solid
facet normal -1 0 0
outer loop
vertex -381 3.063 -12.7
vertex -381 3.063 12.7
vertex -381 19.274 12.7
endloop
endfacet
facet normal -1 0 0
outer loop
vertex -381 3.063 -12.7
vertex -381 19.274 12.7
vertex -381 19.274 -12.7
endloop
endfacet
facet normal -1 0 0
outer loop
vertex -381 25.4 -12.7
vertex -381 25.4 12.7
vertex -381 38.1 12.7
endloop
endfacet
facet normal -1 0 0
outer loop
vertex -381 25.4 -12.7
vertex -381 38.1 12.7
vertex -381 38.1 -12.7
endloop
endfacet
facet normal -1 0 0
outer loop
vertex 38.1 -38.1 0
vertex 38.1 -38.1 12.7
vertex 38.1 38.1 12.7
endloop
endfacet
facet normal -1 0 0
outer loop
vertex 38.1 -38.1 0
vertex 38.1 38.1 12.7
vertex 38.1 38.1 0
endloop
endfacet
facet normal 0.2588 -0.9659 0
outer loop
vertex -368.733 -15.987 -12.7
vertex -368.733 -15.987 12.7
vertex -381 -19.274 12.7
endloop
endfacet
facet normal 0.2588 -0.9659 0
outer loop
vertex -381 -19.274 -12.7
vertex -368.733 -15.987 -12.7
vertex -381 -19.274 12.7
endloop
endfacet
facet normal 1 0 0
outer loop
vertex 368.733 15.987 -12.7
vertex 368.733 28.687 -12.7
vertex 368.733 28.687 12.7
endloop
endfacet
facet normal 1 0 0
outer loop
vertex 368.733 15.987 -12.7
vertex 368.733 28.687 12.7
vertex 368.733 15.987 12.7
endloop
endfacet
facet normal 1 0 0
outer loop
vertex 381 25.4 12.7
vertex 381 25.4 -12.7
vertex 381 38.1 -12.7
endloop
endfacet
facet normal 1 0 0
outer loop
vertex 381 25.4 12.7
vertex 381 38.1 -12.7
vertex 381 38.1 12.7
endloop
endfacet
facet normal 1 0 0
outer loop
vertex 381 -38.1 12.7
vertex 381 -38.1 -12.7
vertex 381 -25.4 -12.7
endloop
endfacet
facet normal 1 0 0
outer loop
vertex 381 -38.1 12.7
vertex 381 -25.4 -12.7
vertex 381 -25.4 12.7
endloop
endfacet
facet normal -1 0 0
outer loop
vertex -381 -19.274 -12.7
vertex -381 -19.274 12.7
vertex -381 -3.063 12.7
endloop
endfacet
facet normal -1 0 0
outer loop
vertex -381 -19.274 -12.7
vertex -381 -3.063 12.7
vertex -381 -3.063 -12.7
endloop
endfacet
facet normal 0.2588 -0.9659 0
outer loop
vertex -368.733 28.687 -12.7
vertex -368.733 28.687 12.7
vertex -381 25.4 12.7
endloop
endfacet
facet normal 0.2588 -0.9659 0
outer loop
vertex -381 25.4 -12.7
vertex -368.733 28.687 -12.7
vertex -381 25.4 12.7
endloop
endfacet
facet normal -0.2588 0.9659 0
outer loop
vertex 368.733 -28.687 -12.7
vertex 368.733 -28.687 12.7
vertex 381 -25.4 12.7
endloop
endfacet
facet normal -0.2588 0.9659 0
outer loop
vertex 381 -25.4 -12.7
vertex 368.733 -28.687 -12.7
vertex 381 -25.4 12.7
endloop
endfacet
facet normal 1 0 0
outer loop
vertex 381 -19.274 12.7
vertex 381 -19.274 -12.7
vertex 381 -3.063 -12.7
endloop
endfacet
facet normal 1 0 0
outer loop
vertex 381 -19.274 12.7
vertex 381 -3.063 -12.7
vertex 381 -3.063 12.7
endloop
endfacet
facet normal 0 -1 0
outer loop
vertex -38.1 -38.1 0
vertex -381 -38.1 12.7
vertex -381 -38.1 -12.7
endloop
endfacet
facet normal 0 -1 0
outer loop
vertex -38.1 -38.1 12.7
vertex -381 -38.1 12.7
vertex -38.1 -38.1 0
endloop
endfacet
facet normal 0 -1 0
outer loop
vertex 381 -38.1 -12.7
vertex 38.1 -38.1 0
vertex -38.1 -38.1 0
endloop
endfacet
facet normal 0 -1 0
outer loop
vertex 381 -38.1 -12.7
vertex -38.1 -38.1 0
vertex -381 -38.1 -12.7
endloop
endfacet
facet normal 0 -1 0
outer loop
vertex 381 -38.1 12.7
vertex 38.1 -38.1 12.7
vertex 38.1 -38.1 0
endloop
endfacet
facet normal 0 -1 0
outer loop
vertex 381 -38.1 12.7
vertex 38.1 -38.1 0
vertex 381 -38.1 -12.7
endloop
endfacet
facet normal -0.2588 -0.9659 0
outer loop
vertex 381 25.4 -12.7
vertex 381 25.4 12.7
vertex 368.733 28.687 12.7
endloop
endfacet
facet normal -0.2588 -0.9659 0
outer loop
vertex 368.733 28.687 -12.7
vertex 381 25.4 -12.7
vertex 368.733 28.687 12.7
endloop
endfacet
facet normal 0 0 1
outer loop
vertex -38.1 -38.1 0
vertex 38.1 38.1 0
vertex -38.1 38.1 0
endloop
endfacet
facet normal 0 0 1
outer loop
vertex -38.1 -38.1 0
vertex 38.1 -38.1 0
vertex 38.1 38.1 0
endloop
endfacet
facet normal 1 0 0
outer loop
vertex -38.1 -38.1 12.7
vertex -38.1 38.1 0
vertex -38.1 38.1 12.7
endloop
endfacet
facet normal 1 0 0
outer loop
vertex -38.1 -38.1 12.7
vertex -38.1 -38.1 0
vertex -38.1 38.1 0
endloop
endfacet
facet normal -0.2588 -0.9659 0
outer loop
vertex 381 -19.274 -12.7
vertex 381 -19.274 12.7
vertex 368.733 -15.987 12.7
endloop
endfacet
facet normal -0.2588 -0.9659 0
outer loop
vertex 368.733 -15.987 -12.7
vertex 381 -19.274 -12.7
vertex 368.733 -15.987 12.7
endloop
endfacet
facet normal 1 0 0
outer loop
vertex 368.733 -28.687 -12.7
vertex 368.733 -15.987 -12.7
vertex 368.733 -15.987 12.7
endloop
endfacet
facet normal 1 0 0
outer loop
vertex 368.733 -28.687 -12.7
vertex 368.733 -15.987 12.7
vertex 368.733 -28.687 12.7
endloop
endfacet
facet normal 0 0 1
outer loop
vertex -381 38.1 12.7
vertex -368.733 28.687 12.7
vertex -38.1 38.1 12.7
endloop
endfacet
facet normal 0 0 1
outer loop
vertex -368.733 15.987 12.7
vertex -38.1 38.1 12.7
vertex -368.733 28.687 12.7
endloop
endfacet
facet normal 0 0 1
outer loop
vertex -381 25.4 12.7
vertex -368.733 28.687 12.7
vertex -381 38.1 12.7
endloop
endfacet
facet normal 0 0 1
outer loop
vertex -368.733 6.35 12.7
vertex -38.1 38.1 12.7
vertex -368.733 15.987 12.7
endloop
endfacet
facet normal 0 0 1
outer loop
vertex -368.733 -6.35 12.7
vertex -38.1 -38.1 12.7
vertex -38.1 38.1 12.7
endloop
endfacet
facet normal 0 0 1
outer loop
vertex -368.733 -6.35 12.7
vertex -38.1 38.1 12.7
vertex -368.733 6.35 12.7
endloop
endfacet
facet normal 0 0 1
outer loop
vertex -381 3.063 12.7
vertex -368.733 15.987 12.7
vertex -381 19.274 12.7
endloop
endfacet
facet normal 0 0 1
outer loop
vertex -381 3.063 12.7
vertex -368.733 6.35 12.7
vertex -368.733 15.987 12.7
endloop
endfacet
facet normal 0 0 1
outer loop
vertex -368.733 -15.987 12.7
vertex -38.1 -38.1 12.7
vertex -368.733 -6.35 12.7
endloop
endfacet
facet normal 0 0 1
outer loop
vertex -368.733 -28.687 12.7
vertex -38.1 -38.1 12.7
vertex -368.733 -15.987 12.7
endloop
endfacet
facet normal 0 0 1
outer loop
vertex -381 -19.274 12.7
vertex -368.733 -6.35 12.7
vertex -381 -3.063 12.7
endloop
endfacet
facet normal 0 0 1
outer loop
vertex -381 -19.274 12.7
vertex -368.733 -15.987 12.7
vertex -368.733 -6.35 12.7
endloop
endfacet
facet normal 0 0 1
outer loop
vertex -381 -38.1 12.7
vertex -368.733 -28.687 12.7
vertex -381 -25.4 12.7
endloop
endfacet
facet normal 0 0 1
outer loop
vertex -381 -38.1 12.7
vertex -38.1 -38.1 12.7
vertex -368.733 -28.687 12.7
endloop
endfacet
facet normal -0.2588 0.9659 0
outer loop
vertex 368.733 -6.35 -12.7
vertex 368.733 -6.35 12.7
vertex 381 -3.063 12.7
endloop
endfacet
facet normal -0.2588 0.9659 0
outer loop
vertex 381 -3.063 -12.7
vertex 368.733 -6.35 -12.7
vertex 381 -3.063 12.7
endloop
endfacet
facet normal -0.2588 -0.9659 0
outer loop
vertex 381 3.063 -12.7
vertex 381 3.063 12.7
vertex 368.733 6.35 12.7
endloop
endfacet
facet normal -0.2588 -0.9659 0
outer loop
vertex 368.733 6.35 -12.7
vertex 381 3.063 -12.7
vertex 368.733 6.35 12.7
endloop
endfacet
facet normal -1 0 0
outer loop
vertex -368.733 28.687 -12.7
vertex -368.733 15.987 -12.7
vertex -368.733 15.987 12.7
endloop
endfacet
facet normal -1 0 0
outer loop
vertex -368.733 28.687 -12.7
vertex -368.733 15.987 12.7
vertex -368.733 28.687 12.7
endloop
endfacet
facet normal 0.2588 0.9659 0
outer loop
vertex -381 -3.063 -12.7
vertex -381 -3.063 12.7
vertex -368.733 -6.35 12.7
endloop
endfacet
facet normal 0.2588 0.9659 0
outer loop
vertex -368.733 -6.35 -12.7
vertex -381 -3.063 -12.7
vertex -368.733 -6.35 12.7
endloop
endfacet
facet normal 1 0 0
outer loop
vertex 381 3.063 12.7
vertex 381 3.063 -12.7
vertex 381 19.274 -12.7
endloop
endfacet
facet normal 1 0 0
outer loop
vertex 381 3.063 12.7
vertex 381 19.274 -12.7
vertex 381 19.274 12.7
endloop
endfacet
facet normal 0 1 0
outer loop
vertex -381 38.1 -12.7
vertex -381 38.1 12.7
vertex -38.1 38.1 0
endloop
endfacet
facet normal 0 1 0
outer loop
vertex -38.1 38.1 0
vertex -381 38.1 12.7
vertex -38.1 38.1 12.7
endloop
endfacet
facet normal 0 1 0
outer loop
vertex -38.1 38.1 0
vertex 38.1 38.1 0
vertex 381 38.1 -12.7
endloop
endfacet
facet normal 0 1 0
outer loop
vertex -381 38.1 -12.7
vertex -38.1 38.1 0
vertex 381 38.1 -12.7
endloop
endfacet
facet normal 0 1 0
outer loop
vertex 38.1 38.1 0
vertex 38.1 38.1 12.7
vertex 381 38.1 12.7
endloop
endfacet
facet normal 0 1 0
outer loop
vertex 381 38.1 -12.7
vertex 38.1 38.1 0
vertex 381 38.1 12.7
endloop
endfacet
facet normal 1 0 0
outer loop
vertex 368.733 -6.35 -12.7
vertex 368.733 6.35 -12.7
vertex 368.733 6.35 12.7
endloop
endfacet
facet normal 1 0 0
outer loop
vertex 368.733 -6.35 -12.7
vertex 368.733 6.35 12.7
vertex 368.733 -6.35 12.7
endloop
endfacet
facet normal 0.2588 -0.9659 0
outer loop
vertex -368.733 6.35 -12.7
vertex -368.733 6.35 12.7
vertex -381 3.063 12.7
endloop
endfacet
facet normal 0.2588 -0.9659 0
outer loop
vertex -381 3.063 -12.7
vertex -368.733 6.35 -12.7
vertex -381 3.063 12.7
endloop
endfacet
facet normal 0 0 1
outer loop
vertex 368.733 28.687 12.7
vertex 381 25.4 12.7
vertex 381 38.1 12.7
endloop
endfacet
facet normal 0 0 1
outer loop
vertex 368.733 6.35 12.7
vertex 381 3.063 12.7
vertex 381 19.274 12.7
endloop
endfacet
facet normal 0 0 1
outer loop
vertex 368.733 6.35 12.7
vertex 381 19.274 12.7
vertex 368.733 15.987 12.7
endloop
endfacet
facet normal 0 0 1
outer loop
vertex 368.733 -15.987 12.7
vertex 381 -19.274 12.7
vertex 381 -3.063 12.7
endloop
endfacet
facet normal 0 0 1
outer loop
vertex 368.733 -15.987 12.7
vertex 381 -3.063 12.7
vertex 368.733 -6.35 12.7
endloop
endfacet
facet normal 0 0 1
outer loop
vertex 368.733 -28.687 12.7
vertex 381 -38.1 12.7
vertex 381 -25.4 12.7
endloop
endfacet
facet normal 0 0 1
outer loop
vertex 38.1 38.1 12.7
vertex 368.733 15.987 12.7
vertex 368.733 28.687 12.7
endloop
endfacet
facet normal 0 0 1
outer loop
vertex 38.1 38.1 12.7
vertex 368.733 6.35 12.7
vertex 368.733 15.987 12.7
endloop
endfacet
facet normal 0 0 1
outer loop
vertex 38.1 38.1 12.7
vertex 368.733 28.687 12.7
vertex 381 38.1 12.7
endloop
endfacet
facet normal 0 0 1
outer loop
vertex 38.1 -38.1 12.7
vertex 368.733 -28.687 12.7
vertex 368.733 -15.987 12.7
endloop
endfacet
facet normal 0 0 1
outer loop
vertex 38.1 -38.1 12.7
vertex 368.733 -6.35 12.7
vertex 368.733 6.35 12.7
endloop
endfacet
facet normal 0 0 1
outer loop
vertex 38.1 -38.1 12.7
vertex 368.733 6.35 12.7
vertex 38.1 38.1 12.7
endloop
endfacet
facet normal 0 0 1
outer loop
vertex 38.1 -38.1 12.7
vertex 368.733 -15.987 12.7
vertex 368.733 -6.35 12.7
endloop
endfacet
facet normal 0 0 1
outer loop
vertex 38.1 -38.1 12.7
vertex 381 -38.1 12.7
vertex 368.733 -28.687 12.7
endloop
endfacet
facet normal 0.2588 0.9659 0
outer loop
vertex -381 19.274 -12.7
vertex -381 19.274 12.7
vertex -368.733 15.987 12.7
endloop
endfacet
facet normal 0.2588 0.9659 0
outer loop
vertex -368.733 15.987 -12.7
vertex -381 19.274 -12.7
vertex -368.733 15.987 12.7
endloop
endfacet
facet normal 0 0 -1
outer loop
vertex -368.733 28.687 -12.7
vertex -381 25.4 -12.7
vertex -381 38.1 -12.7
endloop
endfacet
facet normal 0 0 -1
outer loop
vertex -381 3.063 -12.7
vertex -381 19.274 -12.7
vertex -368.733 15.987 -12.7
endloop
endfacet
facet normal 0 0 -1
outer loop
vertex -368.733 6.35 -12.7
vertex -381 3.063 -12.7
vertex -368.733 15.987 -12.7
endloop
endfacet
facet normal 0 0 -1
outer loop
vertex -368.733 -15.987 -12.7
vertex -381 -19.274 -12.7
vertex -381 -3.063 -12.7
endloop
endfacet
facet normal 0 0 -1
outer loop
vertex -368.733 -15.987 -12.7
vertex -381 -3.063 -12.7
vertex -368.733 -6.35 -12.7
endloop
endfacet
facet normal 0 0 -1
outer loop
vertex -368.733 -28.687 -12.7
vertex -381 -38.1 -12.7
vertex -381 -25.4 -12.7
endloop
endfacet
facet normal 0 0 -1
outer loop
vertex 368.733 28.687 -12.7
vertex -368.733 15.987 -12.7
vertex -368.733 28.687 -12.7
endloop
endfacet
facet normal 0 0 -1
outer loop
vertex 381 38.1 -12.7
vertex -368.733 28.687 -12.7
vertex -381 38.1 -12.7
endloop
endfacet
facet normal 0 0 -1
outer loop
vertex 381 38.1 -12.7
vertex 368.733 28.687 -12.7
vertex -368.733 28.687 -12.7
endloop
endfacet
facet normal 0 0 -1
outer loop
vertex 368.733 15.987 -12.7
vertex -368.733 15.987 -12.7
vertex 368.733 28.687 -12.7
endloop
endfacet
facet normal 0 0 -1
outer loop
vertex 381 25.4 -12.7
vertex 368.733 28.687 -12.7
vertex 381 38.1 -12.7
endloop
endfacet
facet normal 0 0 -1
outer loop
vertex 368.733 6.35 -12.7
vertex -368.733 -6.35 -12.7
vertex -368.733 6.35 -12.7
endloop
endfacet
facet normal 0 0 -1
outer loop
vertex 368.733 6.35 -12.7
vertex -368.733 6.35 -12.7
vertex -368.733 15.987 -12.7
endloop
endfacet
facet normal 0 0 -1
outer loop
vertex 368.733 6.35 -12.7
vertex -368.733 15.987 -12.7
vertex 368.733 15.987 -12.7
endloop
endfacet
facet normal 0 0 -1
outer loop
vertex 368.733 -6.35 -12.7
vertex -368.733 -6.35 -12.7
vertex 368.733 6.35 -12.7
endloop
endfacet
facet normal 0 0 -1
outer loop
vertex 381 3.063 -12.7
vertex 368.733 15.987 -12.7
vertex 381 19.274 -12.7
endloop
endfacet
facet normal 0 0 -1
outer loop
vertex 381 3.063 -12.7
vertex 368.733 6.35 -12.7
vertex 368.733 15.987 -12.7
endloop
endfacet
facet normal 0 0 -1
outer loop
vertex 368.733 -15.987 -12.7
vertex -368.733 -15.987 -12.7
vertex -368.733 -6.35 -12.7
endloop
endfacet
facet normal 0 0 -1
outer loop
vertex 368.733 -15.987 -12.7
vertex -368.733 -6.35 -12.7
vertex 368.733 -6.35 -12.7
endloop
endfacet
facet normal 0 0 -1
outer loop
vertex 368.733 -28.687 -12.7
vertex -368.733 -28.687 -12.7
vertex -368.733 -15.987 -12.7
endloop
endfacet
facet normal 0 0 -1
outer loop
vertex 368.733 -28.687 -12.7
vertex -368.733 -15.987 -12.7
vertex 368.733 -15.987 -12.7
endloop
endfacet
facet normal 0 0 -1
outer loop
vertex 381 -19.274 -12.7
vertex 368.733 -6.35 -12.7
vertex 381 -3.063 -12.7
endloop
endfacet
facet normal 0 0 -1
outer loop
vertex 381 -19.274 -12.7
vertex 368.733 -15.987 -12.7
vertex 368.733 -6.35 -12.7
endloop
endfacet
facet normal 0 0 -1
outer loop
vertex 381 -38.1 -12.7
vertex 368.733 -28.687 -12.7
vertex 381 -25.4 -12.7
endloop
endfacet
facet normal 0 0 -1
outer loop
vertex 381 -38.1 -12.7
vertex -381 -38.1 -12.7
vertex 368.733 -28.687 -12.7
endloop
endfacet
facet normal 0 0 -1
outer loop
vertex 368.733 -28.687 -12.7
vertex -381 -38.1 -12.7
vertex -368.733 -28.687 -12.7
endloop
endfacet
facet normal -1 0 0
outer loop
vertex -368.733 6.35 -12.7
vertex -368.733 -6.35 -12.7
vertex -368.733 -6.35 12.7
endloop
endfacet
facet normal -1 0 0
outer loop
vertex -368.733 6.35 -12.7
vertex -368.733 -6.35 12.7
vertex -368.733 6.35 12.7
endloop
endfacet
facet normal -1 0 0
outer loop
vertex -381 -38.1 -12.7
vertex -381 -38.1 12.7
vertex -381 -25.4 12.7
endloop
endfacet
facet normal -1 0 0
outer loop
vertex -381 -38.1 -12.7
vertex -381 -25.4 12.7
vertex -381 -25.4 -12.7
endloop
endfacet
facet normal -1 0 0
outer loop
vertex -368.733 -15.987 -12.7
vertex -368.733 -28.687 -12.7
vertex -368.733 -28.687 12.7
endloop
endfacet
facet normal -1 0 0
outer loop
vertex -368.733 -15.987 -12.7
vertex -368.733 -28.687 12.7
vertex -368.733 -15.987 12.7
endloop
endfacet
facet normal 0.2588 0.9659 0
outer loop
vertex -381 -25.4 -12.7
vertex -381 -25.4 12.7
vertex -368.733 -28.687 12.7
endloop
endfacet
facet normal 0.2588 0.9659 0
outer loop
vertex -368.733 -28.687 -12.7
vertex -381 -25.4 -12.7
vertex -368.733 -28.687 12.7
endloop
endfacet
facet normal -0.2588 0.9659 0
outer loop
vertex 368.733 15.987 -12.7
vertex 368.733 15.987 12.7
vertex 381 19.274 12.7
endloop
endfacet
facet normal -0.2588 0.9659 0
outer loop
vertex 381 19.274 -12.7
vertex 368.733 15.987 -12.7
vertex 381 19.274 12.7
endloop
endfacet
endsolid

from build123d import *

# Parameters (mm, degrees)
F1_DEPTH = 38.1
F3_DEPTH = 25.401


with BuildPart() as f1:
    # F0 (on Front) → F1 (new body, symmetric)
    with BuildSketch(Plane.XZ):
        Polygon((-38.1, 12.7), (-381, 12.7), (-381, -12.7), (381, -12.7), (381, 12.7), (38.1, 12.7), (38.1, 0), (-38.1, 0), align=None)
    extrude(amount=F1_DEPTH, both=True)

    # F2 (on face) → F3 (cut, through all)
    with BuildSketch(Plane.XY.offset(12.7)):
        Polygon((-368.732742, 15.987002), (-368.732742, 28.687002), (-381, 25.4), (-381, 19.274004), align=None)
        Polygon((-368.732742, 6.35), (-381, 3.062998), (-381, -3.062998), (-368.732742, -6.35), align=None)
        Polygon((-368.732742, -28.687002), (-368.732742, -15.987002), (-381, -19.274004), (-381, -25.4), align=None)
        Polygon((381, 19.274004), (381, 25.4), (368.732742, 28.687002), (368.732742, 15.987002), align=None)
        Polygon((381, -3.062998), (381, 3.062998), (368.732742, 6.35), (368.732742, -6.35), align=None)
        Polygon((381, -25.4), (381, -19.274004), (368.732742, -15.987002), (368.732742, -28.687002), align=None)
    extrude(amount=-F3_DEPTH, mode=Mode.SUBTRACT)


solid = f1.part
